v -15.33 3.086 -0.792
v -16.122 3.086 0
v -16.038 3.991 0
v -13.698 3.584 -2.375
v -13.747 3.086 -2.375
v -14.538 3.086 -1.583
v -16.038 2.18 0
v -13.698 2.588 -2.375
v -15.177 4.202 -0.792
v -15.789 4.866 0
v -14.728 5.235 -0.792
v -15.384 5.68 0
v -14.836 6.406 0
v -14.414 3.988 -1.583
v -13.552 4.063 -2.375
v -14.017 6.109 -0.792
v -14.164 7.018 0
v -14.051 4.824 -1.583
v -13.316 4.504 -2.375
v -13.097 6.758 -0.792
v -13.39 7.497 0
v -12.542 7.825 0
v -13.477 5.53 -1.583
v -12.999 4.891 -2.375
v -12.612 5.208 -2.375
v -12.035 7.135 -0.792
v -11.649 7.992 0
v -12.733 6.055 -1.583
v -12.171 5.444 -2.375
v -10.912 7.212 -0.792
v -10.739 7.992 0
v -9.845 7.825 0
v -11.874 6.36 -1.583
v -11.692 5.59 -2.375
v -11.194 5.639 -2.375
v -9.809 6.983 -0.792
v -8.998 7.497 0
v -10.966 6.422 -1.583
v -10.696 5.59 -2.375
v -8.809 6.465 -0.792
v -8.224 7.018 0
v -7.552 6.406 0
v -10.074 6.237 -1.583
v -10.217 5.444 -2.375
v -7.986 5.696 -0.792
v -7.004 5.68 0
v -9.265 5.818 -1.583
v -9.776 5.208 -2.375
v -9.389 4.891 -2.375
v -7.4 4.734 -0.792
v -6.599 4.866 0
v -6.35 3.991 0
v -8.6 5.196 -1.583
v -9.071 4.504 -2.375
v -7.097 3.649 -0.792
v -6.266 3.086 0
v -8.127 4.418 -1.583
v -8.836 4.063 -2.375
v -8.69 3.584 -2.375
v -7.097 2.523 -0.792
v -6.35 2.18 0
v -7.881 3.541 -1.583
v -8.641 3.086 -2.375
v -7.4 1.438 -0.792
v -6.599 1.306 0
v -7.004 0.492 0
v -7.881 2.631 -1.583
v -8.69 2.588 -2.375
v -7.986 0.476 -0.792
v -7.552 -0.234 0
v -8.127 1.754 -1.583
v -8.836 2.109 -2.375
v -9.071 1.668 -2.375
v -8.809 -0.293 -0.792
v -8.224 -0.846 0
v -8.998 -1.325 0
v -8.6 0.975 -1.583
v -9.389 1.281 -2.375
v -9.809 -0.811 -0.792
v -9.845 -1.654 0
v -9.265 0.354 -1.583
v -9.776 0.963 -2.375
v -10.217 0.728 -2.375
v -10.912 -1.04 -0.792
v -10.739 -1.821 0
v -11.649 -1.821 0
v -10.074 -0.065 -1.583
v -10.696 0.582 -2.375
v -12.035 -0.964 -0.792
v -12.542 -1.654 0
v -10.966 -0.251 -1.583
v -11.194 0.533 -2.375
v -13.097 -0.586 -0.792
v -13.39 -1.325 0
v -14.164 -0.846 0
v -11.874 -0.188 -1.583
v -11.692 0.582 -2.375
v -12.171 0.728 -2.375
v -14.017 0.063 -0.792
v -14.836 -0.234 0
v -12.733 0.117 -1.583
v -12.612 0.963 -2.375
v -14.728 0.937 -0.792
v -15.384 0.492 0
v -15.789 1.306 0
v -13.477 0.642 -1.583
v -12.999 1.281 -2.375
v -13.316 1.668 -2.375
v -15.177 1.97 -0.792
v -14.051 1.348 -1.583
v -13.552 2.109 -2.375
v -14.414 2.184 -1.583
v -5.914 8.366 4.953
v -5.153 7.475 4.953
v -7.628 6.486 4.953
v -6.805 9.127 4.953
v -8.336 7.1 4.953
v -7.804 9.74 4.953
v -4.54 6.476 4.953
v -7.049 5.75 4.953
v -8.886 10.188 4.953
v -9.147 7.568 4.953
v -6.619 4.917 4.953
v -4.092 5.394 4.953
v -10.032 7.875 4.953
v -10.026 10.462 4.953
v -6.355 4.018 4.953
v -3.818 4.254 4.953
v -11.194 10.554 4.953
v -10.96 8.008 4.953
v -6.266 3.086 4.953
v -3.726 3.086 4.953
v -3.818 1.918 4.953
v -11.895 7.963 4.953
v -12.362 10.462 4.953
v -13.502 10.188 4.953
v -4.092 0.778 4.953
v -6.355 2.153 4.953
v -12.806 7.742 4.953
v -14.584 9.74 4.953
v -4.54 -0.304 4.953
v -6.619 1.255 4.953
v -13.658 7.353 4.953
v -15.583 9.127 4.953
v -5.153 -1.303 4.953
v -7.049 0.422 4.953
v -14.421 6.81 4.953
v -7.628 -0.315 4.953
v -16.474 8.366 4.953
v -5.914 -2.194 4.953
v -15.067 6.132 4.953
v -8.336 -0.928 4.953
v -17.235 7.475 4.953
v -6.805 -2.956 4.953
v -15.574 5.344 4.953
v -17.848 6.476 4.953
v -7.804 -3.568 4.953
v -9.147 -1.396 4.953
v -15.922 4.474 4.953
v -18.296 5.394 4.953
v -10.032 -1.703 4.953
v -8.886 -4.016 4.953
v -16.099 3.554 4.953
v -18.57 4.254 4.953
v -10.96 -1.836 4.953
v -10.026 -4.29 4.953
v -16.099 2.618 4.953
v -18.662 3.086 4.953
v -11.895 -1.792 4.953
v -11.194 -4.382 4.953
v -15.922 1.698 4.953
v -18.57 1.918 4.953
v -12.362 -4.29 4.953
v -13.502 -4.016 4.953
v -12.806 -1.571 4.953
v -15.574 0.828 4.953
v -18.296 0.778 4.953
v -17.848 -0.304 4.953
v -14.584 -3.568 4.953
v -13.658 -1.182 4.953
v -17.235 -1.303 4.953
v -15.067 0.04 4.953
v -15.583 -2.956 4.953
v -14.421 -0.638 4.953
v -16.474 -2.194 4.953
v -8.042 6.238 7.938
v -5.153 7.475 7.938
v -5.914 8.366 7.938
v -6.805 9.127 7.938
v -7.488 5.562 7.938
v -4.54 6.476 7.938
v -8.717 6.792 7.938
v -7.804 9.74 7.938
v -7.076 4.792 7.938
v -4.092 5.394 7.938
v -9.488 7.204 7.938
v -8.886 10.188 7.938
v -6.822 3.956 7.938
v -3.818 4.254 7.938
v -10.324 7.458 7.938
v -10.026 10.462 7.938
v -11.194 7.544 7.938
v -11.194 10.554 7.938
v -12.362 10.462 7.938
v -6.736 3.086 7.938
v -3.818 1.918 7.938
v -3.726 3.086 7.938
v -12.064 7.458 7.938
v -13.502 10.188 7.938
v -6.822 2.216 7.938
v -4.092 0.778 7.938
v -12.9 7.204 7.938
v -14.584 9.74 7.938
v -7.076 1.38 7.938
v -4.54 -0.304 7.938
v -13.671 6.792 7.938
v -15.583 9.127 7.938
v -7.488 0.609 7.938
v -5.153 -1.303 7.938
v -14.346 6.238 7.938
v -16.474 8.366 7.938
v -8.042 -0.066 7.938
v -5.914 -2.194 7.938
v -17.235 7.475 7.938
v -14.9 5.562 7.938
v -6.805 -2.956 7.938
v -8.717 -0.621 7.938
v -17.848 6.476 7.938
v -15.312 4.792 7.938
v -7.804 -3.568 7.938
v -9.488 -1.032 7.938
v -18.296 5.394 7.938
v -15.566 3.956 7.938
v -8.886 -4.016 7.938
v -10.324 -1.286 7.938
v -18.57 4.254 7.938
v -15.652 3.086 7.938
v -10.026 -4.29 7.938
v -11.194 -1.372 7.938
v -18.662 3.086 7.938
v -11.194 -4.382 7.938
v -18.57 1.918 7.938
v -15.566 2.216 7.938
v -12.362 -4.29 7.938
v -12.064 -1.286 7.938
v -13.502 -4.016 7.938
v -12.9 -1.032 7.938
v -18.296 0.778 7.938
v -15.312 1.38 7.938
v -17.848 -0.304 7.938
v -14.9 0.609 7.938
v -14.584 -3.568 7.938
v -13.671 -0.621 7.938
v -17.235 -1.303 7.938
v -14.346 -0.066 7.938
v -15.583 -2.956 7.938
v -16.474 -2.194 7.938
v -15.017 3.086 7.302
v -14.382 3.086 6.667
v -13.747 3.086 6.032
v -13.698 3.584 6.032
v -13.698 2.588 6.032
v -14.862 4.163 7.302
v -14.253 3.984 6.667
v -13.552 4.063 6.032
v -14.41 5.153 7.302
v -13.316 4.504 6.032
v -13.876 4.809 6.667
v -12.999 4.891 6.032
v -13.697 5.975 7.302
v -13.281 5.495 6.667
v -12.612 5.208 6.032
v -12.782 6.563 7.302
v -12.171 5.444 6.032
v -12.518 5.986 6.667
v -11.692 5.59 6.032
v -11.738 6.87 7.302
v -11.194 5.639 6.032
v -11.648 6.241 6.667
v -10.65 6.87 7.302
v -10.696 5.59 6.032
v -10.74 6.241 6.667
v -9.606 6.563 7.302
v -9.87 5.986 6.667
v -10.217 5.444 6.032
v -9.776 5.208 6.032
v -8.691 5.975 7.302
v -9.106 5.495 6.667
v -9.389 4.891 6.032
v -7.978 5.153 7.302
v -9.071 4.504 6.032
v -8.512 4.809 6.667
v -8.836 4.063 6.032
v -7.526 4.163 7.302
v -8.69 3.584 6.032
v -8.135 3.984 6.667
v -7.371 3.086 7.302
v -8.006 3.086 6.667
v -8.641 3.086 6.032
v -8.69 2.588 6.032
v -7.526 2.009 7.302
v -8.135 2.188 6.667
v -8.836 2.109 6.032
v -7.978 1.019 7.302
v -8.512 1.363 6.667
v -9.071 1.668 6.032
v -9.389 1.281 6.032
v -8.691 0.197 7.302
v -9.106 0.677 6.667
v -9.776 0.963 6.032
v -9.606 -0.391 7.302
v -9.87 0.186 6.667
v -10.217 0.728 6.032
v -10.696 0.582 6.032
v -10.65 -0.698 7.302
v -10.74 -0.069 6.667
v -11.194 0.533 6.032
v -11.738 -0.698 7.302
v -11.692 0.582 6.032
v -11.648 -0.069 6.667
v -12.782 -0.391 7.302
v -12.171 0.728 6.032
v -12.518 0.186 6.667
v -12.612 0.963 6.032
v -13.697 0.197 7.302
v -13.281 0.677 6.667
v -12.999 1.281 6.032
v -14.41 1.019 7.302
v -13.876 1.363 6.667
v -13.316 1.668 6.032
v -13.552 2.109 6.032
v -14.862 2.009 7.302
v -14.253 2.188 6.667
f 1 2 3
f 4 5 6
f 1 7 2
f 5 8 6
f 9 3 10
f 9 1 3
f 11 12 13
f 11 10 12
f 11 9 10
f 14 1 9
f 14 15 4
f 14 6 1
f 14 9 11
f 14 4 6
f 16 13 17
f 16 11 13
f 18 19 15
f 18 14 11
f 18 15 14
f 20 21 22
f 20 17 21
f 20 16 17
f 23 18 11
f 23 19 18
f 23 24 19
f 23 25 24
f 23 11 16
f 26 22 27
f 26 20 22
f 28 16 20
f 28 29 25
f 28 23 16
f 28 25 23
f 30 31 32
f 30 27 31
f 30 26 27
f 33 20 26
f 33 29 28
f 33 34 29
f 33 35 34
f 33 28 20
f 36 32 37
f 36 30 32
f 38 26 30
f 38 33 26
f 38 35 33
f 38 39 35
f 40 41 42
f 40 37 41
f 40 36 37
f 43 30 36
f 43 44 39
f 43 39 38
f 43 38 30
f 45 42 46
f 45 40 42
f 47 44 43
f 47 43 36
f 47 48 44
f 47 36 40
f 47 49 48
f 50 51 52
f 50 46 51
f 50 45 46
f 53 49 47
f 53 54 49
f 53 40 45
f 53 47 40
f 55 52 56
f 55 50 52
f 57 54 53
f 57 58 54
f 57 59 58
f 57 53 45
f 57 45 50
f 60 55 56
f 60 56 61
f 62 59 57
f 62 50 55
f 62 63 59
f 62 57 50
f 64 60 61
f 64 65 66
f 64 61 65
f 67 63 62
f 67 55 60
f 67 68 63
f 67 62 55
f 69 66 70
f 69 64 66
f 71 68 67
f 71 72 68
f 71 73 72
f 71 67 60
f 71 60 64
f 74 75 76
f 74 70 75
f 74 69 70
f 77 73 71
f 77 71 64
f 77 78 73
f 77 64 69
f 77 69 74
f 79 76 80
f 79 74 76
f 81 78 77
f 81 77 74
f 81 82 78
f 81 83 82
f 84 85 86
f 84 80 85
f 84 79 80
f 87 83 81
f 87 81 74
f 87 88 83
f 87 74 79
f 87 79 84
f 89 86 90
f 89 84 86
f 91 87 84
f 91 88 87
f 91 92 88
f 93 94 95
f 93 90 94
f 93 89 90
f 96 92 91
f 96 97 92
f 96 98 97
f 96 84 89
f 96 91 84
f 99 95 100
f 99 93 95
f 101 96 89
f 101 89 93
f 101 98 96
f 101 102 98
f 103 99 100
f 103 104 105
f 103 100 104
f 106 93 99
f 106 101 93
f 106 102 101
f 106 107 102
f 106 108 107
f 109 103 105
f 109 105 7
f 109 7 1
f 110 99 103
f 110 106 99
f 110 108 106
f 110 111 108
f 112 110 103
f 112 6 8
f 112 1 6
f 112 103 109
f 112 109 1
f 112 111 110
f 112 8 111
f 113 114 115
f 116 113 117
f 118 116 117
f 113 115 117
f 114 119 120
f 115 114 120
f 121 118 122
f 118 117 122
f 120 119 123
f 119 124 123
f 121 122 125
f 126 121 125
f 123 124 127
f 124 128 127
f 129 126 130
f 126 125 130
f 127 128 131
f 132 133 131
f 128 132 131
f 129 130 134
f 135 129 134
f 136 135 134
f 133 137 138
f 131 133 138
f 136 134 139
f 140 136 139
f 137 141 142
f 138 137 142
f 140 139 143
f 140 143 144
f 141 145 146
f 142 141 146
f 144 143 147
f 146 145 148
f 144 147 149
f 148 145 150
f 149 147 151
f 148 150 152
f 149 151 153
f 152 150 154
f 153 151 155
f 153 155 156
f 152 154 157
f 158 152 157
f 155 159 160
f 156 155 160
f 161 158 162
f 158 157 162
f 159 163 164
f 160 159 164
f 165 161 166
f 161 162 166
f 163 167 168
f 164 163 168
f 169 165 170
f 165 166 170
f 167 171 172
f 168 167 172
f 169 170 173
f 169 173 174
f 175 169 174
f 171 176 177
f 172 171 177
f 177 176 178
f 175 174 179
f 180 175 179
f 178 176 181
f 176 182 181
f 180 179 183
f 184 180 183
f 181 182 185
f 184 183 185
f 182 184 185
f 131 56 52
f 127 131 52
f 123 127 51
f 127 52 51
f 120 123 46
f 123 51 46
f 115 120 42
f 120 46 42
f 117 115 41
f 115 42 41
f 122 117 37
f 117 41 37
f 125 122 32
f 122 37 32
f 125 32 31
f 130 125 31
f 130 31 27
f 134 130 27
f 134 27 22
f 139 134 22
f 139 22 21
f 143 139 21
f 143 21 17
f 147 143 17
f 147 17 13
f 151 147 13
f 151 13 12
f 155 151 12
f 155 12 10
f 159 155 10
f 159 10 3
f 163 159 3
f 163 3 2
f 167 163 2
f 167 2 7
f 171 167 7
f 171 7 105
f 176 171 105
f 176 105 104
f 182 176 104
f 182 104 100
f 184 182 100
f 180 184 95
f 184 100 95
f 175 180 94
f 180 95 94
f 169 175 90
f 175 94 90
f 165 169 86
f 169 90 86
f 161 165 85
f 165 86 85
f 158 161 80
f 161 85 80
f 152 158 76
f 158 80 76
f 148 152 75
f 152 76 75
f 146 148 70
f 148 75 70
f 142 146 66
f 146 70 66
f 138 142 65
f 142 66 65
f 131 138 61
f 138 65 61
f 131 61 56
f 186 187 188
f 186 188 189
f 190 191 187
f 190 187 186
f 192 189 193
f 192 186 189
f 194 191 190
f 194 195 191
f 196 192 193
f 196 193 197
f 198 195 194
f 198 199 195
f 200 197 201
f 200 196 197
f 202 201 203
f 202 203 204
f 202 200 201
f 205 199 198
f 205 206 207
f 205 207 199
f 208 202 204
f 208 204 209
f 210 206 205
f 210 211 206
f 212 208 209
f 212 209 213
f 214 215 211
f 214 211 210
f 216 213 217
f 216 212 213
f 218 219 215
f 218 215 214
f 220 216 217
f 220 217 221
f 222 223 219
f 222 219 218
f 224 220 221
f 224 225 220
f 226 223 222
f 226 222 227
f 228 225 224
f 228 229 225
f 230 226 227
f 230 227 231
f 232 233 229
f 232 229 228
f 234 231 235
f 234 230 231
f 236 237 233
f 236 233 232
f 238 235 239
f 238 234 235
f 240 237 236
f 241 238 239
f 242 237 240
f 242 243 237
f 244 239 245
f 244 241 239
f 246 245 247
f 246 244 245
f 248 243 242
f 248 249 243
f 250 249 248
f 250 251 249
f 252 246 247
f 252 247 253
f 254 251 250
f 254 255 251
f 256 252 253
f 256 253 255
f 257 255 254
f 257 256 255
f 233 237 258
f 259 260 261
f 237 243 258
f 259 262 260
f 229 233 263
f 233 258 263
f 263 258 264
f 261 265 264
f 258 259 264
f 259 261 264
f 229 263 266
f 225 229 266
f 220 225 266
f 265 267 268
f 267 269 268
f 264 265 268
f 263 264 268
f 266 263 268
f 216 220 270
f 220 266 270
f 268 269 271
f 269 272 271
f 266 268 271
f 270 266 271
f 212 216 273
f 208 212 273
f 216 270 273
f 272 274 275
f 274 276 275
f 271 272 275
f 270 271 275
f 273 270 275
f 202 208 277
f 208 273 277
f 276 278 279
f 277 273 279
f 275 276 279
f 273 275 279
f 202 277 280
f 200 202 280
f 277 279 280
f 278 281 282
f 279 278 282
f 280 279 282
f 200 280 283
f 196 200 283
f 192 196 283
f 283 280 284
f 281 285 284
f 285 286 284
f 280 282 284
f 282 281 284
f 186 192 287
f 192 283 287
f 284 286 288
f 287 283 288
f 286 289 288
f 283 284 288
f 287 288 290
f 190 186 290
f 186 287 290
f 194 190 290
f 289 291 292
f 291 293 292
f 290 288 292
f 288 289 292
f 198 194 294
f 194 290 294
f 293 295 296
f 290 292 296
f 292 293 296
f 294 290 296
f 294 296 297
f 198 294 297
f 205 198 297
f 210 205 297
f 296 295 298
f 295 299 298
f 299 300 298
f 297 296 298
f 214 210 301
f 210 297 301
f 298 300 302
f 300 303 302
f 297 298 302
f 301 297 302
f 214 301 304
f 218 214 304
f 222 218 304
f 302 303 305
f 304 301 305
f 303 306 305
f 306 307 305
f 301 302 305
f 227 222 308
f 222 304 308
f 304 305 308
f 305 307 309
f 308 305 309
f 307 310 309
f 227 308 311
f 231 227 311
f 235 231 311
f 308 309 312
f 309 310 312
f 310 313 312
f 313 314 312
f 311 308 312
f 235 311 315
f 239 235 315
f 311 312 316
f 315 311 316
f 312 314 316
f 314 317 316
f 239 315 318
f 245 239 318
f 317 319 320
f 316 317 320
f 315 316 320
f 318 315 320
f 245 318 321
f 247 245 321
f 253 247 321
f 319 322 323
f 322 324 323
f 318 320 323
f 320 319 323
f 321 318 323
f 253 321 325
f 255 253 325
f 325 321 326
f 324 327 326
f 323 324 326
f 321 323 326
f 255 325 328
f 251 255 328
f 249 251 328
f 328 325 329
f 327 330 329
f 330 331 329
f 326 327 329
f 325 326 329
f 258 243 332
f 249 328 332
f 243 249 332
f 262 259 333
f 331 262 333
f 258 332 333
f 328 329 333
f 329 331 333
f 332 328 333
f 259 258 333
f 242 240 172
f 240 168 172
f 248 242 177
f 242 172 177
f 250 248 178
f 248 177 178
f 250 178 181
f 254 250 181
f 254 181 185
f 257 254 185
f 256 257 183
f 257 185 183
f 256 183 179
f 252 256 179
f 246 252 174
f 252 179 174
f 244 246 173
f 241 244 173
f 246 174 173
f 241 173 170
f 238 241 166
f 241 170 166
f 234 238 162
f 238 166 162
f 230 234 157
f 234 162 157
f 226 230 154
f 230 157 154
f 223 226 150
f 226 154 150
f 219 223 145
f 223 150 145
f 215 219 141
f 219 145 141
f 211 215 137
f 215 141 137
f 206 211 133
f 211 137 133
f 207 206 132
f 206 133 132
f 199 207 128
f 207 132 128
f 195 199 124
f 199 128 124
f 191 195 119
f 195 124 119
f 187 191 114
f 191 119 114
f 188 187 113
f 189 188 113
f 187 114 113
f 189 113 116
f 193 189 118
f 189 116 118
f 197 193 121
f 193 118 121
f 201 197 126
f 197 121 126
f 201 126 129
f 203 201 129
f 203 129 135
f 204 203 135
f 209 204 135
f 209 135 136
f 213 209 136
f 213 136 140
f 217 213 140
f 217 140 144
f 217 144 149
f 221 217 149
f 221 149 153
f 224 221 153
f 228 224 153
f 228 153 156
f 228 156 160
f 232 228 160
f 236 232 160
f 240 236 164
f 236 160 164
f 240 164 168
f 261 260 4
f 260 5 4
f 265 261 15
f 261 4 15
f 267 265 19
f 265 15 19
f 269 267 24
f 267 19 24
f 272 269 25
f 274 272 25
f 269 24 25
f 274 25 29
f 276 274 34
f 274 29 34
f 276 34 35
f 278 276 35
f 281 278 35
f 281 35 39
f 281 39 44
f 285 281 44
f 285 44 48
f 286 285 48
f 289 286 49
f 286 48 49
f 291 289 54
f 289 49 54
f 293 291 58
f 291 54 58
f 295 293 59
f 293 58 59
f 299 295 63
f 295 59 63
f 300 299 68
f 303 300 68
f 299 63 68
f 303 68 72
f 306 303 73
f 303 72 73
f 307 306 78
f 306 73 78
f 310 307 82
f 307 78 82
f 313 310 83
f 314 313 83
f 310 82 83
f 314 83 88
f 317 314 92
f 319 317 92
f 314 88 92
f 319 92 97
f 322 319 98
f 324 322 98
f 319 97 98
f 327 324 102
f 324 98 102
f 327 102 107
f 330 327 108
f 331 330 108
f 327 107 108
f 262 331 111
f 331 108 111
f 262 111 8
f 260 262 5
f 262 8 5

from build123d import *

# Parameters (mm, degrees)
SKETCH1_R                         = 4.9276
BOSS_EXTRUDE1_DEPTH               = 7.9375
SKETCH4_R                         = 4.9276
BOSS_EXTRUDE2_DEPTH               = 3.175
BOSS_EXTRUDE2_TAPER               = 45
F_1_4_20_TAPPED_HOLE1_D           = 5.1054
F_1_4_20_TAPPED_HOLE1_DEPTH       = 16.51
F_1_4_20_TAPPED_HOLE1_CSINK_D     = 8.9154
F_1_4_20_TAPPED_HOLE1_CSINK_ANGLE = 90
F_1_4_20_TAPPED_HOLE1_TIP         = 1.533816902
SKETCH5_W                         = 2.54
SKETCH5_H                         = 2.9845


with BuildPart() as part:
    # Sketch1 → Boss-Extrude1 (new body)
    with BuildSketch(Plane.XY):
        with Locations((-11.193990041, 3.085910768)):
            Circle(SKETCH1_R)
    extrude(amount=BOSS_EXTRUDE1_DEPTH)

    # Sketch4 → Boss-Extrude2 (add)
    with BuildSketch(Plane(origin=(0, 0, 0), x_dir=(-1, 0, 0), z_dir=(0, 0, -1))):
        with Locations((11.193990041, 3.085910768)):
            Circle(SKETCH4_R)
    extrude(amount=BOSS_EXTRUDE2_DEPTH, taper=BOSS_EXTRUDE2_TAPER)

    # 1/4-20 Tapped Hole1
    with Locations(Plane.XY.offset(7.9375)):
        with Locations((-11.193990041, 3.085910768)):
            CounterSinkHole(F_1_4_20_TAPPED_HOLE1_D / 2, F_1_4_20_TAPPED_HOLE1_CSINK_D / 2, depth=F_1_4_20_TAPPED_HOLE1_DEPTH, counter_sink_angle=F_1_4_20_TAPPED_HOLE1_CSINK_ANGLE)
            with Locations((0, 0, -(F_1_4_20_TAPPED_HOLE1_DEPTH + F_1_4_20_TAPPED_HOLE1_TIP / 2))):  # 118° drill point
                Cone(0, F_1_4_20_TAPPED_HOLE1_D / 2, F_1_4_20_TAPPED_HOLE1_TIP, mode=Mode.SUBTRACT)

    # Sketch5 → Revolve1 (revolve)
    with BuildSketch(Plane(origin=(0, 3.085910768, 0), x_dir=(1, 0, 0), z_dir=(0, 1, 0))):
        with Locations((-17.391590041, -6.44525)):
            Rectangle(SKETCH5_W, SKETCH5_H)
    revolve(axis=Axis((-11.193990041, 3.085910768, -2.3749), (0, 0, 1)))


solid = part.part
